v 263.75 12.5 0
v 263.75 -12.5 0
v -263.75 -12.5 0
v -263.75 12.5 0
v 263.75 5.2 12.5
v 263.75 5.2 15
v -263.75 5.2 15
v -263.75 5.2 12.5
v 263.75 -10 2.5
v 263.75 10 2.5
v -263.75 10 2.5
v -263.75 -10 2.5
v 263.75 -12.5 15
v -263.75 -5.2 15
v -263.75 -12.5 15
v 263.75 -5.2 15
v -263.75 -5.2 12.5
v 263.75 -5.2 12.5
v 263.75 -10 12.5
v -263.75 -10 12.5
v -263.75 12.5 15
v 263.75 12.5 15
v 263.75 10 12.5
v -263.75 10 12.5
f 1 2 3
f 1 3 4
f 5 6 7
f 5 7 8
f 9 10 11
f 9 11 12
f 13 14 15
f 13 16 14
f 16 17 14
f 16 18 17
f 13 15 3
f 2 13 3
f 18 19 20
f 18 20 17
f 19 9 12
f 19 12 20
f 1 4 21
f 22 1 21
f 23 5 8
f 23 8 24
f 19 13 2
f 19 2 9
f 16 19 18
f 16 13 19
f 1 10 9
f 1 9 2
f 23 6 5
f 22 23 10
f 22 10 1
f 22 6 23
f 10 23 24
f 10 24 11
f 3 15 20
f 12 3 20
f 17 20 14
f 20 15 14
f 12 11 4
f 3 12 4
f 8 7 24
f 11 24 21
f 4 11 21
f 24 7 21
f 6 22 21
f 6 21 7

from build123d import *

# Parameters (mm, degrees)
F1_DEPTH = 263.75


with BuildPart() as f1:
    # F0 (on Right) → F1 (new body, symmetric)
    with BuildSketch(Plane.YZ):
        Polygon((-10, 15), (-12.5, 15), (-12.5, 12.5), (-12.5, 0), (12.5, 0), (12.5, 12.5), (12.5, 15), (10, 15), (5.2, 15), (5.2, 12.5), (10, 12.5), (10, 2.5), (-10, 2.5), (-10, 12.5), (-5.2, 12.5), (-5.2, 15), align=None)
    extrude(amount=F1_DEPTH, both=True)


solid = f1.part
